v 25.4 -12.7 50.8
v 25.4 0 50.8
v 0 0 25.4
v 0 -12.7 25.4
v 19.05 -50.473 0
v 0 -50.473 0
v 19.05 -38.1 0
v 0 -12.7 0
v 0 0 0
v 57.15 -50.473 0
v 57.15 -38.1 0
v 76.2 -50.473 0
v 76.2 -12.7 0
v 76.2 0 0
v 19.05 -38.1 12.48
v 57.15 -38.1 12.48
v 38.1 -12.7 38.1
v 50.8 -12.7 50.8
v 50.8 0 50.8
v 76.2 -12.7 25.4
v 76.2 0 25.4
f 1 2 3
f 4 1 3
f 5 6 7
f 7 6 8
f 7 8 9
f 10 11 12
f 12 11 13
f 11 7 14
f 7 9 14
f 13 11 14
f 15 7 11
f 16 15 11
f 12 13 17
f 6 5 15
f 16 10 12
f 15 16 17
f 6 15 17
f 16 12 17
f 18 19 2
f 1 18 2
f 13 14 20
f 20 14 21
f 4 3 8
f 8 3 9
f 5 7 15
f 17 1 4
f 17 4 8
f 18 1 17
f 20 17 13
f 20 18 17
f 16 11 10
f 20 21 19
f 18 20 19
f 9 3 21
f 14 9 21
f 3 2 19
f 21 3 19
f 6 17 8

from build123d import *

# Parameters (mm, degrees)
F1_DEPTH = 12.7
F3_DEPTH = 38.1
F4_W     = 38.1
F4_H     = 12.7
F5_DEPTH = 50.801
F7_DEPTH = 76.201


with BuildPart() as f1:
    # F0 (on Front) → F1 (new body)
    with BuildSketch(Plane.XZ):
        Polygon((25.4, 50.8), (0, 25.4), (0, 0), (76.2, 0), (76.2, 25.4), (50.8, 50.8), align=None)
    extrude(amount=F1_DEPTH)

    # F2 (on face) → F3 (join)
    with BuildSketch(Plane.XZ.offset(12.7)):
        Polygon((0, 0), (76.2, 0), (38.1, 38.1), align=None)
    extrude(amount=F3_DEPTH)

    # F4 (on face) → F5 (cut, through all)
    with BuildSketch(Plane(origin=(0, 0, 0), x_dir=(1, 0, 0), z_dir=(0, 0, -1))):
        with Locations((38.1, 44.45)):
            Rectangle(F4_W, F4_H)
    extrude(amount=-F5_DEPTH, mode=Mode.SUBTRACT)

    # F6 (on face) → F7 (cut, through all)
    with BuildSketch(Plane.YZ.offset(76.2)):
        Polygon((-51.202006, -0.734927), (-12.7, 38.1), (-51.202006, 38.1), align=None)
    extrude(amount=-F7_DEPTH, mode=Mode.SUBTRACT)


solid = f1.part
